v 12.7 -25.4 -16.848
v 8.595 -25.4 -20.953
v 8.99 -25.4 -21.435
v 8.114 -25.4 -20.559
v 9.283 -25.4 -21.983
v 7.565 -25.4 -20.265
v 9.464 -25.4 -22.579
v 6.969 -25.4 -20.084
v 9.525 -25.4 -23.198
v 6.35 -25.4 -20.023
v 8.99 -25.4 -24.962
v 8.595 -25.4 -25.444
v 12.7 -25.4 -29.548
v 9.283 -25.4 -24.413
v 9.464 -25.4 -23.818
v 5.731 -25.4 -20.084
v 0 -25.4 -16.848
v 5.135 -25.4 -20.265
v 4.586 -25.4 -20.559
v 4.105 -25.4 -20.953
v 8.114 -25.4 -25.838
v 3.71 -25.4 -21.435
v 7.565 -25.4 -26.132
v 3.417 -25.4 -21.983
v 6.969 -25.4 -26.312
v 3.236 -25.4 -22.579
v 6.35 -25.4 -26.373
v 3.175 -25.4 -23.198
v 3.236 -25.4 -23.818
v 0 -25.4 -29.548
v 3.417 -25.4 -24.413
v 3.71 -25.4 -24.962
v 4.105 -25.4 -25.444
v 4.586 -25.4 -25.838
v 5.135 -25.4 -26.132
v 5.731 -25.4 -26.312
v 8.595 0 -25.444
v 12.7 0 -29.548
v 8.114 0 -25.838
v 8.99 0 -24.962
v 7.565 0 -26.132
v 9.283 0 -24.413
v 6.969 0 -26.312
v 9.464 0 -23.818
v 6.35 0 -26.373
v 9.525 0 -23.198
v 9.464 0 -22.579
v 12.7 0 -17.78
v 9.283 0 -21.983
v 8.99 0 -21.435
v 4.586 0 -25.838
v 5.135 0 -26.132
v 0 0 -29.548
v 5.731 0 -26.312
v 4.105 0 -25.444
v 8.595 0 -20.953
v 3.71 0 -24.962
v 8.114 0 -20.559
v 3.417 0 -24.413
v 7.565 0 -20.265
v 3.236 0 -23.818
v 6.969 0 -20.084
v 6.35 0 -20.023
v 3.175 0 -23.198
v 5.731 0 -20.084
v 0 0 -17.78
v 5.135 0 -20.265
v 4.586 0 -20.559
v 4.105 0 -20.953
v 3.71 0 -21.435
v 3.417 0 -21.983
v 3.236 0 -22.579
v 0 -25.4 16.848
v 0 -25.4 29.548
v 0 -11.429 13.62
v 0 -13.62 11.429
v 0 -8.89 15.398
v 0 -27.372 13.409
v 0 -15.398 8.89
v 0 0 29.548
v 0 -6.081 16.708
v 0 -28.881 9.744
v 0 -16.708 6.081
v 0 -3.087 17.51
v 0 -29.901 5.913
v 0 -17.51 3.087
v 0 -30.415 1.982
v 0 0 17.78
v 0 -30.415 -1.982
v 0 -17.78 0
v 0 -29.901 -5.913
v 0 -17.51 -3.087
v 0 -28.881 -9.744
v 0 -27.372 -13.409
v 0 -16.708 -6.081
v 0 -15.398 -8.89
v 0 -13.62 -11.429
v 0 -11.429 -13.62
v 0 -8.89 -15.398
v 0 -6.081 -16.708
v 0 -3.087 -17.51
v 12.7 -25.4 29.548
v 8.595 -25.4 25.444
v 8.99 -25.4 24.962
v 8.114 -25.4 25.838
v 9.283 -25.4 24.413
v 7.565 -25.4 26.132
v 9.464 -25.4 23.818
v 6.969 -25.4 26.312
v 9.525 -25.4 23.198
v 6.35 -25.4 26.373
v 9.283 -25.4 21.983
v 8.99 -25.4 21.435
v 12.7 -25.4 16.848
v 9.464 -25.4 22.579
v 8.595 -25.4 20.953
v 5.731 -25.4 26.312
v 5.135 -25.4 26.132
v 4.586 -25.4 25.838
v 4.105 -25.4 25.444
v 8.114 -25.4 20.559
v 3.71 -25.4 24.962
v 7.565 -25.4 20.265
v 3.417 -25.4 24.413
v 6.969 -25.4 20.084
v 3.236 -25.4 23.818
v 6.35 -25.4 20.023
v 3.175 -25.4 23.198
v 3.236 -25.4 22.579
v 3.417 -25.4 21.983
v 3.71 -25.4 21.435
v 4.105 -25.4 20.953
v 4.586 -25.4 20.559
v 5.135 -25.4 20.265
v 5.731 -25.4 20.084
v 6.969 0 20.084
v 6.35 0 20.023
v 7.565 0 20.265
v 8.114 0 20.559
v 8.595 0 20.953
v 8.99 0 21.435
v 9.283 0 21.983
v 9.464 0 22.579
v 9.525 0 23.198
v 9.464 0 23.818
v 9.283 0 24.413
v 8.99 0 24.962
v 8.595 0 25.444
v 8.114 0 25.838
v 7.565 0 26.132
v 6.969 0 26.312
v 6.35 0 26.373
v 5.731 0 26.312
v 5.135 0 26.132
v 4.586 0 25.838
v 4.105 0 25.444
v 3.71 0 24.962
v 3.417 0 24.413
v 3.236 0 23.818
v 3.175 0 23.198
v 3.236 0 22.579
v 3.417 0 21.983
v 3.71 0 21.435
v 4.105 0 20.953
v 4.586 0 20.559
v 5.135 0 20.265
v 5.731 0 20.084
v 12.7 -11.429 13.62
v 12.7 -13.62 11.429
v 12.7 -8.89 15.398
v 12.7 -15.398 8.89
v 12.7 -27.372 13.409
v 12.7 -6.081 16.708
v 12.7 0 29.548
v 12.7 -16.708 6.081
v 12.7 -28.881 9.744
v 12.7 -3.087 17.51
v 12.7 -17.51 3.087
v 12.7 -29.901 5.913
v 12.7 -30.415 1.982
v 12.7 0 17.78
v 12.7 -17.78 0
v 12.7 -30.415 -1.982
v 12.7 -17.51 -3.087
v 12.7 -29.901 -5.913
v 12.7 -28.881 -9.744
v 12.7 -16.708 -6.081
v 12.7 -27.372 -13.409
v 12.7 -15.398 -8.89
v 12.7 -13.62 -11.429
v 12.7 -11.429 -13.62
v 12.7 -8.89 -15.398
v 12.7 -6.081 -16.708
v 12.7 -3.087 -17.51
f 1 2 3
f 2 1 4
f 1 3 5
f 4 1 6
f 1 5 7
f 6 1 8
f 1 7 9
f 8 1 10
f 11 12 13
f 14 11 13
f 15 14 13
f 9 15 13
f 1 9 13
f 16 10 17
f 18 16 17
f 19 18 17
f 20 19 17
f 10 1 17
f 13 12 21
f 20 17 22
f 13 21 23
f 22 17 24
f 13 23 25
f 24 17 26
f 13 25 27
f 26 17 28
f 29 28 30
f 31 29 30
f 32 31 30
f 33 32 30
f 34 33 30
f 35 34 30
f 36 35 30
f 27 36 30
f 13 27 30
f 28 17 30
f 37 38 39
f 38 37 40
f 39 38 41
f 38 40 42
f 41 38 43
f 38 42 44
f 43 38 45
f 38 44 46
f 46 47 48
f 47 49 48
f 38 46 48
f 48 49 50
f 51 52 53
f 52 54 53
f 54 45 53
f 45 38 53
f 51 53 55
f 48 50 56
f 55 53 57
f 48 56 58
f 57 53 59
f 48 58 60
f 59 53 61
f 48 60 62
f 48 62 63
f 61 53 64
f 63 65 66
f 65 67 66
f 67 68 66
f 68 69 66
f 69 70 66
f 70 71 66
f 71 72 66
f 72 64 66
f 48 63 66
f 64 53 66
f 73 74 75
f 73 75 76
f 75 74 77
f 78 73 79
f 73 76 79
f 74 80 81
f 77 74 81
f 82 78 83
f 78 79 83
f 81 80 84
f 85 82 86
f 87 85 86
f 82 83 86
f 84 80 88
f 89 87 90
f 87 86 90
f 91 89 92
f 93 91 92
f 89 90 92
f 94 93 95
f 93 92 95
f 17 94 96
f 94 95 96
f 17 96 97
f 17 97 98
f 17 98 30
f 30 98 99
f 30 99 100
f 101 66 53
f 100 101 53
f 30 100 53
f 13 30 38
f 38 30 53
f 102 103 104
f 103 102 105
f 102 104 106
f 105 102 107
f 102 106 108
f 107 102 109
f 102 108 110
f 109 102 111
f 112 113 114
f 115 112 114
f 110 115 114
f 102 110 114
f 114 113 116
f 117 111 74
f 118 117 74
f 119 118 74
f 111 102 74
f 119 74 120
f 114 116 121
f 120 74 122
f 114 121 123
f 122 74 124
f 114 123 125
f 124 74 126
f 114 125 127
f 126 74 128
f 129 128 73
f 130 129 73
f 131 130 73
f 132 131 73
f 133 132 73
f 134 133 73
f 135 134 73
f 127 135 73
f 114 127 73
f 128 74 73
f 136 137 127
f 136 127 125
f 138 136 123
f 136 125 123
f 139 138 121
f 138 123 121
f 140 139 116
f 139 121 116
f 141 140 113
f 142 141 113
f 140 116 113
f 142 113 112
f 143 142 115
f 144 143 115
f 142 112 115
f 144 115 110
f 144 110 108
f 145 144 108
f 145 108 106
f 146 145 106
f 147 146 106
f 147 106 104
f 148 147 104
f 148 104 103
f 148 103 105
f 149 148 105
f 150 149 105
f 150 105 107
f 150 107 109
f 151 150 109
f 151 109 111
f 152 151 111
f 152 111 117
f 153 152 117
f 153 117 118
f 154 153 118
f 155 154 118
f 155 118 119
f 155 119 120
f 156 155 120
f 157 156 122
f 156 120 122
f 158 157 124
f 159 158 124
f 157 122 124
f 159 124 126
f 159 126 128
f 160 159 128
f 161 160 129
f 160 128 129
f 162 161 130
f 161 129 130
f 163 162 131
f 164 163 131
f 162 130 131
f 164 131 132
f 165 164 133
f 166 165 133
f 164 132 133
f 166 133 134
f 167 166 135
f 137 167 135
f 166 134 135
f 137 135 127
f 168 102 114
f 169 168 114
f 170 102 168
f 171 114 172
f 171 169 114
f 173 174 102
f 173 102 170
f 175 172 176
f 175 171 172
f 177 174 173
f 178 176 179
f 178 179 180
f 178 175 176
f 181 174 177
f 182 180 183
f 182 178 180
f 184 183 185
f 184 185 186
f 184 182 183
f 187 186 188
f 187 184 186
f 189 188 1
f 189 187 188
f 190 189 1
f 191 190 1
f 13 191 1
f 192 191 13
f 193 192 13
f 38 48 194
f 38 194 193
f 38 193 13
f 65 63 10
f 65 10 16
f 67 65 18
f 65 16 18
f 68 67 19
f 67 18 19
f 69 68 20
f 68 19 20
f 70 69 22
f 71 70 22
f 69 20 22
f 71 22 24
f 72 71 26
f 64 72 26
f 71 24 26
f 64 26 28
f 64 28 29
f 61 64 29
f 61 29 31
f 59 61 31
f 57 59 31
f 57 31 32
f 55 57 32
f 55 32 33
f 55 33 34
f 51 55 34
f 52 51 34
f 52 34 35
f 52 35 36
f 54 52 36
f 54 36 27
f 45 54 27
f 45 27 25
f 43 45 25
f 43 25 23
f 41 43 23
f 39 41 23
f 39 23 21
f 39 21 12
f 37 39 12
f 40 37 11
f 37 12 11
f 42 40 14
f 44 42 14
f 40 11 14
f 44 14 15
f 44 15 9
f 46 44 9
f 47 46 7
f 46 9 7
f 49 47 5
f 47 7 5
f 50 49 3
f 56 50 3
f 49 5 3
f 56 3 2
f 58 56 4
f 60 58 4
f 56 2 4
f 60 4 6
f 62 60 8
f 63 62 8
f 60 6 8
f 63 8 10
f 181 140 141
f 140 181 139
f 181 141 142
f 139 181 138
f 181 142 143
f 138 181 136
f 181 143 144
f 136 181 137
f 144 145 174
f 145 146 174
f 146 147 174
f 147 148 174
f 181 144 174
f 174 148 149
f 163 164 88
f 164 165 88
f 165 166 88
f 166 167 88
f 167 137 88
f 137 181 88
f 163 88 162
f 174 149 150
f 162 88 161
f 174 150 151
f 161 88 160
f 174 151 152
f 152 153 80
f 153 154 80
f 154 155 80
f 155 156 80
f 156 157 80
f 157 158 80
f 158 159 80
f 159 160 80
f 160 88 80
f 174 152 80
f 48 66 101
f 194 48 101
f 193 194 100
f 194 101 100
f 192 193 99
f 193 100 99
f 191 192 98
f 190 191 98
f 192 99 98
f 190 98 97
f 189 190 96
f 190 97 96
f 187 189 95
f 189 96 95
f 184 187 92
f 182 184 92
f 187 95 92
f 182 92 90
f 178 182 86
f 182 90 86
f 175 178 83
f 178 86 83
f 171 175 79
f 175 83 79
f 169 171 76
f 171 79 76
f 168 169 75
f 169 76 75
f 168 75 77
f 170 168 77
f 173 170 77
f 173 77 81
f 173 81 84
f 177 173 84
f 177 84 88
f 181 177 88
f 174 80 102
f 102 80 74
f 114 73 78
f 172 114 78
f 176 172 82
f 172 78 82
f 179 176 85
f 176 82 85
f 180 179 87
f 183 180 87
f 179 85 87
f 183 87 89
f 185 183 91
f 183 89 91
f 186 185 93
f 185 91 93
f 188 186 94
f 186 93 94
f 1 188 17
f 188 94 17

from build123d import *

# Parameters (mm, degrees)
BOSS_EXTRUDE1_DEPTH = 12.7
SKETCH2_R           = 3.175
CUT_EXTRUDE1_DEPTH  = 41.982449048


with BuildPart() as part:
    # Sketch1 → Boss-Extrude1 (new body)
    with BuildSketch(Plane(origin=(0, 0, 0), x_dir=(0, 0, -1), z_dir=(1, 0, 0))):
        with BuildLine():
            Line((-17.78, 0), (-29.548453935, 0))
            Line((-29.548453935, 0), (-29.548453935, -25.4))
            Line((-29.548453935, -25.4), (-16.848453935, -25.4))
            ThreePointArc((-16.848453935, -25.4), (0, -30.48), (16.848453935, -25.4))
            Line((16.848453935, -25.4), (29.548453935, -25.4))
            Line((29.548453935, -25.4), (29.548453935, 0))
            Line((29.548453935, 0), (17.78, 0))
            ThreePointArc((17.78, 0), (0, -17.78), (-17.78, 0))
        make_face()
    extrude(amount=BOSS_EXTRUDE1_DEPTH)

    # Sketch2 → Cut-Extrude1 (cut, through all)
    with BuildSketch(Plane.XZ.offset(25.4)):
        with Locations(Location((6.35, 23.198453935, 0), (0, 0, 270))):
            Circle(SKETCH2_R)
        with Locations(Location((6.35, -23.198453935, 0), (0, 0, 90))):
            Circle(SKETCH2_R)
    extrude(amount=-CUT_EXTRUDE1_DEPTH, mode=Mode.SUBTRACT)


solid = part.part
